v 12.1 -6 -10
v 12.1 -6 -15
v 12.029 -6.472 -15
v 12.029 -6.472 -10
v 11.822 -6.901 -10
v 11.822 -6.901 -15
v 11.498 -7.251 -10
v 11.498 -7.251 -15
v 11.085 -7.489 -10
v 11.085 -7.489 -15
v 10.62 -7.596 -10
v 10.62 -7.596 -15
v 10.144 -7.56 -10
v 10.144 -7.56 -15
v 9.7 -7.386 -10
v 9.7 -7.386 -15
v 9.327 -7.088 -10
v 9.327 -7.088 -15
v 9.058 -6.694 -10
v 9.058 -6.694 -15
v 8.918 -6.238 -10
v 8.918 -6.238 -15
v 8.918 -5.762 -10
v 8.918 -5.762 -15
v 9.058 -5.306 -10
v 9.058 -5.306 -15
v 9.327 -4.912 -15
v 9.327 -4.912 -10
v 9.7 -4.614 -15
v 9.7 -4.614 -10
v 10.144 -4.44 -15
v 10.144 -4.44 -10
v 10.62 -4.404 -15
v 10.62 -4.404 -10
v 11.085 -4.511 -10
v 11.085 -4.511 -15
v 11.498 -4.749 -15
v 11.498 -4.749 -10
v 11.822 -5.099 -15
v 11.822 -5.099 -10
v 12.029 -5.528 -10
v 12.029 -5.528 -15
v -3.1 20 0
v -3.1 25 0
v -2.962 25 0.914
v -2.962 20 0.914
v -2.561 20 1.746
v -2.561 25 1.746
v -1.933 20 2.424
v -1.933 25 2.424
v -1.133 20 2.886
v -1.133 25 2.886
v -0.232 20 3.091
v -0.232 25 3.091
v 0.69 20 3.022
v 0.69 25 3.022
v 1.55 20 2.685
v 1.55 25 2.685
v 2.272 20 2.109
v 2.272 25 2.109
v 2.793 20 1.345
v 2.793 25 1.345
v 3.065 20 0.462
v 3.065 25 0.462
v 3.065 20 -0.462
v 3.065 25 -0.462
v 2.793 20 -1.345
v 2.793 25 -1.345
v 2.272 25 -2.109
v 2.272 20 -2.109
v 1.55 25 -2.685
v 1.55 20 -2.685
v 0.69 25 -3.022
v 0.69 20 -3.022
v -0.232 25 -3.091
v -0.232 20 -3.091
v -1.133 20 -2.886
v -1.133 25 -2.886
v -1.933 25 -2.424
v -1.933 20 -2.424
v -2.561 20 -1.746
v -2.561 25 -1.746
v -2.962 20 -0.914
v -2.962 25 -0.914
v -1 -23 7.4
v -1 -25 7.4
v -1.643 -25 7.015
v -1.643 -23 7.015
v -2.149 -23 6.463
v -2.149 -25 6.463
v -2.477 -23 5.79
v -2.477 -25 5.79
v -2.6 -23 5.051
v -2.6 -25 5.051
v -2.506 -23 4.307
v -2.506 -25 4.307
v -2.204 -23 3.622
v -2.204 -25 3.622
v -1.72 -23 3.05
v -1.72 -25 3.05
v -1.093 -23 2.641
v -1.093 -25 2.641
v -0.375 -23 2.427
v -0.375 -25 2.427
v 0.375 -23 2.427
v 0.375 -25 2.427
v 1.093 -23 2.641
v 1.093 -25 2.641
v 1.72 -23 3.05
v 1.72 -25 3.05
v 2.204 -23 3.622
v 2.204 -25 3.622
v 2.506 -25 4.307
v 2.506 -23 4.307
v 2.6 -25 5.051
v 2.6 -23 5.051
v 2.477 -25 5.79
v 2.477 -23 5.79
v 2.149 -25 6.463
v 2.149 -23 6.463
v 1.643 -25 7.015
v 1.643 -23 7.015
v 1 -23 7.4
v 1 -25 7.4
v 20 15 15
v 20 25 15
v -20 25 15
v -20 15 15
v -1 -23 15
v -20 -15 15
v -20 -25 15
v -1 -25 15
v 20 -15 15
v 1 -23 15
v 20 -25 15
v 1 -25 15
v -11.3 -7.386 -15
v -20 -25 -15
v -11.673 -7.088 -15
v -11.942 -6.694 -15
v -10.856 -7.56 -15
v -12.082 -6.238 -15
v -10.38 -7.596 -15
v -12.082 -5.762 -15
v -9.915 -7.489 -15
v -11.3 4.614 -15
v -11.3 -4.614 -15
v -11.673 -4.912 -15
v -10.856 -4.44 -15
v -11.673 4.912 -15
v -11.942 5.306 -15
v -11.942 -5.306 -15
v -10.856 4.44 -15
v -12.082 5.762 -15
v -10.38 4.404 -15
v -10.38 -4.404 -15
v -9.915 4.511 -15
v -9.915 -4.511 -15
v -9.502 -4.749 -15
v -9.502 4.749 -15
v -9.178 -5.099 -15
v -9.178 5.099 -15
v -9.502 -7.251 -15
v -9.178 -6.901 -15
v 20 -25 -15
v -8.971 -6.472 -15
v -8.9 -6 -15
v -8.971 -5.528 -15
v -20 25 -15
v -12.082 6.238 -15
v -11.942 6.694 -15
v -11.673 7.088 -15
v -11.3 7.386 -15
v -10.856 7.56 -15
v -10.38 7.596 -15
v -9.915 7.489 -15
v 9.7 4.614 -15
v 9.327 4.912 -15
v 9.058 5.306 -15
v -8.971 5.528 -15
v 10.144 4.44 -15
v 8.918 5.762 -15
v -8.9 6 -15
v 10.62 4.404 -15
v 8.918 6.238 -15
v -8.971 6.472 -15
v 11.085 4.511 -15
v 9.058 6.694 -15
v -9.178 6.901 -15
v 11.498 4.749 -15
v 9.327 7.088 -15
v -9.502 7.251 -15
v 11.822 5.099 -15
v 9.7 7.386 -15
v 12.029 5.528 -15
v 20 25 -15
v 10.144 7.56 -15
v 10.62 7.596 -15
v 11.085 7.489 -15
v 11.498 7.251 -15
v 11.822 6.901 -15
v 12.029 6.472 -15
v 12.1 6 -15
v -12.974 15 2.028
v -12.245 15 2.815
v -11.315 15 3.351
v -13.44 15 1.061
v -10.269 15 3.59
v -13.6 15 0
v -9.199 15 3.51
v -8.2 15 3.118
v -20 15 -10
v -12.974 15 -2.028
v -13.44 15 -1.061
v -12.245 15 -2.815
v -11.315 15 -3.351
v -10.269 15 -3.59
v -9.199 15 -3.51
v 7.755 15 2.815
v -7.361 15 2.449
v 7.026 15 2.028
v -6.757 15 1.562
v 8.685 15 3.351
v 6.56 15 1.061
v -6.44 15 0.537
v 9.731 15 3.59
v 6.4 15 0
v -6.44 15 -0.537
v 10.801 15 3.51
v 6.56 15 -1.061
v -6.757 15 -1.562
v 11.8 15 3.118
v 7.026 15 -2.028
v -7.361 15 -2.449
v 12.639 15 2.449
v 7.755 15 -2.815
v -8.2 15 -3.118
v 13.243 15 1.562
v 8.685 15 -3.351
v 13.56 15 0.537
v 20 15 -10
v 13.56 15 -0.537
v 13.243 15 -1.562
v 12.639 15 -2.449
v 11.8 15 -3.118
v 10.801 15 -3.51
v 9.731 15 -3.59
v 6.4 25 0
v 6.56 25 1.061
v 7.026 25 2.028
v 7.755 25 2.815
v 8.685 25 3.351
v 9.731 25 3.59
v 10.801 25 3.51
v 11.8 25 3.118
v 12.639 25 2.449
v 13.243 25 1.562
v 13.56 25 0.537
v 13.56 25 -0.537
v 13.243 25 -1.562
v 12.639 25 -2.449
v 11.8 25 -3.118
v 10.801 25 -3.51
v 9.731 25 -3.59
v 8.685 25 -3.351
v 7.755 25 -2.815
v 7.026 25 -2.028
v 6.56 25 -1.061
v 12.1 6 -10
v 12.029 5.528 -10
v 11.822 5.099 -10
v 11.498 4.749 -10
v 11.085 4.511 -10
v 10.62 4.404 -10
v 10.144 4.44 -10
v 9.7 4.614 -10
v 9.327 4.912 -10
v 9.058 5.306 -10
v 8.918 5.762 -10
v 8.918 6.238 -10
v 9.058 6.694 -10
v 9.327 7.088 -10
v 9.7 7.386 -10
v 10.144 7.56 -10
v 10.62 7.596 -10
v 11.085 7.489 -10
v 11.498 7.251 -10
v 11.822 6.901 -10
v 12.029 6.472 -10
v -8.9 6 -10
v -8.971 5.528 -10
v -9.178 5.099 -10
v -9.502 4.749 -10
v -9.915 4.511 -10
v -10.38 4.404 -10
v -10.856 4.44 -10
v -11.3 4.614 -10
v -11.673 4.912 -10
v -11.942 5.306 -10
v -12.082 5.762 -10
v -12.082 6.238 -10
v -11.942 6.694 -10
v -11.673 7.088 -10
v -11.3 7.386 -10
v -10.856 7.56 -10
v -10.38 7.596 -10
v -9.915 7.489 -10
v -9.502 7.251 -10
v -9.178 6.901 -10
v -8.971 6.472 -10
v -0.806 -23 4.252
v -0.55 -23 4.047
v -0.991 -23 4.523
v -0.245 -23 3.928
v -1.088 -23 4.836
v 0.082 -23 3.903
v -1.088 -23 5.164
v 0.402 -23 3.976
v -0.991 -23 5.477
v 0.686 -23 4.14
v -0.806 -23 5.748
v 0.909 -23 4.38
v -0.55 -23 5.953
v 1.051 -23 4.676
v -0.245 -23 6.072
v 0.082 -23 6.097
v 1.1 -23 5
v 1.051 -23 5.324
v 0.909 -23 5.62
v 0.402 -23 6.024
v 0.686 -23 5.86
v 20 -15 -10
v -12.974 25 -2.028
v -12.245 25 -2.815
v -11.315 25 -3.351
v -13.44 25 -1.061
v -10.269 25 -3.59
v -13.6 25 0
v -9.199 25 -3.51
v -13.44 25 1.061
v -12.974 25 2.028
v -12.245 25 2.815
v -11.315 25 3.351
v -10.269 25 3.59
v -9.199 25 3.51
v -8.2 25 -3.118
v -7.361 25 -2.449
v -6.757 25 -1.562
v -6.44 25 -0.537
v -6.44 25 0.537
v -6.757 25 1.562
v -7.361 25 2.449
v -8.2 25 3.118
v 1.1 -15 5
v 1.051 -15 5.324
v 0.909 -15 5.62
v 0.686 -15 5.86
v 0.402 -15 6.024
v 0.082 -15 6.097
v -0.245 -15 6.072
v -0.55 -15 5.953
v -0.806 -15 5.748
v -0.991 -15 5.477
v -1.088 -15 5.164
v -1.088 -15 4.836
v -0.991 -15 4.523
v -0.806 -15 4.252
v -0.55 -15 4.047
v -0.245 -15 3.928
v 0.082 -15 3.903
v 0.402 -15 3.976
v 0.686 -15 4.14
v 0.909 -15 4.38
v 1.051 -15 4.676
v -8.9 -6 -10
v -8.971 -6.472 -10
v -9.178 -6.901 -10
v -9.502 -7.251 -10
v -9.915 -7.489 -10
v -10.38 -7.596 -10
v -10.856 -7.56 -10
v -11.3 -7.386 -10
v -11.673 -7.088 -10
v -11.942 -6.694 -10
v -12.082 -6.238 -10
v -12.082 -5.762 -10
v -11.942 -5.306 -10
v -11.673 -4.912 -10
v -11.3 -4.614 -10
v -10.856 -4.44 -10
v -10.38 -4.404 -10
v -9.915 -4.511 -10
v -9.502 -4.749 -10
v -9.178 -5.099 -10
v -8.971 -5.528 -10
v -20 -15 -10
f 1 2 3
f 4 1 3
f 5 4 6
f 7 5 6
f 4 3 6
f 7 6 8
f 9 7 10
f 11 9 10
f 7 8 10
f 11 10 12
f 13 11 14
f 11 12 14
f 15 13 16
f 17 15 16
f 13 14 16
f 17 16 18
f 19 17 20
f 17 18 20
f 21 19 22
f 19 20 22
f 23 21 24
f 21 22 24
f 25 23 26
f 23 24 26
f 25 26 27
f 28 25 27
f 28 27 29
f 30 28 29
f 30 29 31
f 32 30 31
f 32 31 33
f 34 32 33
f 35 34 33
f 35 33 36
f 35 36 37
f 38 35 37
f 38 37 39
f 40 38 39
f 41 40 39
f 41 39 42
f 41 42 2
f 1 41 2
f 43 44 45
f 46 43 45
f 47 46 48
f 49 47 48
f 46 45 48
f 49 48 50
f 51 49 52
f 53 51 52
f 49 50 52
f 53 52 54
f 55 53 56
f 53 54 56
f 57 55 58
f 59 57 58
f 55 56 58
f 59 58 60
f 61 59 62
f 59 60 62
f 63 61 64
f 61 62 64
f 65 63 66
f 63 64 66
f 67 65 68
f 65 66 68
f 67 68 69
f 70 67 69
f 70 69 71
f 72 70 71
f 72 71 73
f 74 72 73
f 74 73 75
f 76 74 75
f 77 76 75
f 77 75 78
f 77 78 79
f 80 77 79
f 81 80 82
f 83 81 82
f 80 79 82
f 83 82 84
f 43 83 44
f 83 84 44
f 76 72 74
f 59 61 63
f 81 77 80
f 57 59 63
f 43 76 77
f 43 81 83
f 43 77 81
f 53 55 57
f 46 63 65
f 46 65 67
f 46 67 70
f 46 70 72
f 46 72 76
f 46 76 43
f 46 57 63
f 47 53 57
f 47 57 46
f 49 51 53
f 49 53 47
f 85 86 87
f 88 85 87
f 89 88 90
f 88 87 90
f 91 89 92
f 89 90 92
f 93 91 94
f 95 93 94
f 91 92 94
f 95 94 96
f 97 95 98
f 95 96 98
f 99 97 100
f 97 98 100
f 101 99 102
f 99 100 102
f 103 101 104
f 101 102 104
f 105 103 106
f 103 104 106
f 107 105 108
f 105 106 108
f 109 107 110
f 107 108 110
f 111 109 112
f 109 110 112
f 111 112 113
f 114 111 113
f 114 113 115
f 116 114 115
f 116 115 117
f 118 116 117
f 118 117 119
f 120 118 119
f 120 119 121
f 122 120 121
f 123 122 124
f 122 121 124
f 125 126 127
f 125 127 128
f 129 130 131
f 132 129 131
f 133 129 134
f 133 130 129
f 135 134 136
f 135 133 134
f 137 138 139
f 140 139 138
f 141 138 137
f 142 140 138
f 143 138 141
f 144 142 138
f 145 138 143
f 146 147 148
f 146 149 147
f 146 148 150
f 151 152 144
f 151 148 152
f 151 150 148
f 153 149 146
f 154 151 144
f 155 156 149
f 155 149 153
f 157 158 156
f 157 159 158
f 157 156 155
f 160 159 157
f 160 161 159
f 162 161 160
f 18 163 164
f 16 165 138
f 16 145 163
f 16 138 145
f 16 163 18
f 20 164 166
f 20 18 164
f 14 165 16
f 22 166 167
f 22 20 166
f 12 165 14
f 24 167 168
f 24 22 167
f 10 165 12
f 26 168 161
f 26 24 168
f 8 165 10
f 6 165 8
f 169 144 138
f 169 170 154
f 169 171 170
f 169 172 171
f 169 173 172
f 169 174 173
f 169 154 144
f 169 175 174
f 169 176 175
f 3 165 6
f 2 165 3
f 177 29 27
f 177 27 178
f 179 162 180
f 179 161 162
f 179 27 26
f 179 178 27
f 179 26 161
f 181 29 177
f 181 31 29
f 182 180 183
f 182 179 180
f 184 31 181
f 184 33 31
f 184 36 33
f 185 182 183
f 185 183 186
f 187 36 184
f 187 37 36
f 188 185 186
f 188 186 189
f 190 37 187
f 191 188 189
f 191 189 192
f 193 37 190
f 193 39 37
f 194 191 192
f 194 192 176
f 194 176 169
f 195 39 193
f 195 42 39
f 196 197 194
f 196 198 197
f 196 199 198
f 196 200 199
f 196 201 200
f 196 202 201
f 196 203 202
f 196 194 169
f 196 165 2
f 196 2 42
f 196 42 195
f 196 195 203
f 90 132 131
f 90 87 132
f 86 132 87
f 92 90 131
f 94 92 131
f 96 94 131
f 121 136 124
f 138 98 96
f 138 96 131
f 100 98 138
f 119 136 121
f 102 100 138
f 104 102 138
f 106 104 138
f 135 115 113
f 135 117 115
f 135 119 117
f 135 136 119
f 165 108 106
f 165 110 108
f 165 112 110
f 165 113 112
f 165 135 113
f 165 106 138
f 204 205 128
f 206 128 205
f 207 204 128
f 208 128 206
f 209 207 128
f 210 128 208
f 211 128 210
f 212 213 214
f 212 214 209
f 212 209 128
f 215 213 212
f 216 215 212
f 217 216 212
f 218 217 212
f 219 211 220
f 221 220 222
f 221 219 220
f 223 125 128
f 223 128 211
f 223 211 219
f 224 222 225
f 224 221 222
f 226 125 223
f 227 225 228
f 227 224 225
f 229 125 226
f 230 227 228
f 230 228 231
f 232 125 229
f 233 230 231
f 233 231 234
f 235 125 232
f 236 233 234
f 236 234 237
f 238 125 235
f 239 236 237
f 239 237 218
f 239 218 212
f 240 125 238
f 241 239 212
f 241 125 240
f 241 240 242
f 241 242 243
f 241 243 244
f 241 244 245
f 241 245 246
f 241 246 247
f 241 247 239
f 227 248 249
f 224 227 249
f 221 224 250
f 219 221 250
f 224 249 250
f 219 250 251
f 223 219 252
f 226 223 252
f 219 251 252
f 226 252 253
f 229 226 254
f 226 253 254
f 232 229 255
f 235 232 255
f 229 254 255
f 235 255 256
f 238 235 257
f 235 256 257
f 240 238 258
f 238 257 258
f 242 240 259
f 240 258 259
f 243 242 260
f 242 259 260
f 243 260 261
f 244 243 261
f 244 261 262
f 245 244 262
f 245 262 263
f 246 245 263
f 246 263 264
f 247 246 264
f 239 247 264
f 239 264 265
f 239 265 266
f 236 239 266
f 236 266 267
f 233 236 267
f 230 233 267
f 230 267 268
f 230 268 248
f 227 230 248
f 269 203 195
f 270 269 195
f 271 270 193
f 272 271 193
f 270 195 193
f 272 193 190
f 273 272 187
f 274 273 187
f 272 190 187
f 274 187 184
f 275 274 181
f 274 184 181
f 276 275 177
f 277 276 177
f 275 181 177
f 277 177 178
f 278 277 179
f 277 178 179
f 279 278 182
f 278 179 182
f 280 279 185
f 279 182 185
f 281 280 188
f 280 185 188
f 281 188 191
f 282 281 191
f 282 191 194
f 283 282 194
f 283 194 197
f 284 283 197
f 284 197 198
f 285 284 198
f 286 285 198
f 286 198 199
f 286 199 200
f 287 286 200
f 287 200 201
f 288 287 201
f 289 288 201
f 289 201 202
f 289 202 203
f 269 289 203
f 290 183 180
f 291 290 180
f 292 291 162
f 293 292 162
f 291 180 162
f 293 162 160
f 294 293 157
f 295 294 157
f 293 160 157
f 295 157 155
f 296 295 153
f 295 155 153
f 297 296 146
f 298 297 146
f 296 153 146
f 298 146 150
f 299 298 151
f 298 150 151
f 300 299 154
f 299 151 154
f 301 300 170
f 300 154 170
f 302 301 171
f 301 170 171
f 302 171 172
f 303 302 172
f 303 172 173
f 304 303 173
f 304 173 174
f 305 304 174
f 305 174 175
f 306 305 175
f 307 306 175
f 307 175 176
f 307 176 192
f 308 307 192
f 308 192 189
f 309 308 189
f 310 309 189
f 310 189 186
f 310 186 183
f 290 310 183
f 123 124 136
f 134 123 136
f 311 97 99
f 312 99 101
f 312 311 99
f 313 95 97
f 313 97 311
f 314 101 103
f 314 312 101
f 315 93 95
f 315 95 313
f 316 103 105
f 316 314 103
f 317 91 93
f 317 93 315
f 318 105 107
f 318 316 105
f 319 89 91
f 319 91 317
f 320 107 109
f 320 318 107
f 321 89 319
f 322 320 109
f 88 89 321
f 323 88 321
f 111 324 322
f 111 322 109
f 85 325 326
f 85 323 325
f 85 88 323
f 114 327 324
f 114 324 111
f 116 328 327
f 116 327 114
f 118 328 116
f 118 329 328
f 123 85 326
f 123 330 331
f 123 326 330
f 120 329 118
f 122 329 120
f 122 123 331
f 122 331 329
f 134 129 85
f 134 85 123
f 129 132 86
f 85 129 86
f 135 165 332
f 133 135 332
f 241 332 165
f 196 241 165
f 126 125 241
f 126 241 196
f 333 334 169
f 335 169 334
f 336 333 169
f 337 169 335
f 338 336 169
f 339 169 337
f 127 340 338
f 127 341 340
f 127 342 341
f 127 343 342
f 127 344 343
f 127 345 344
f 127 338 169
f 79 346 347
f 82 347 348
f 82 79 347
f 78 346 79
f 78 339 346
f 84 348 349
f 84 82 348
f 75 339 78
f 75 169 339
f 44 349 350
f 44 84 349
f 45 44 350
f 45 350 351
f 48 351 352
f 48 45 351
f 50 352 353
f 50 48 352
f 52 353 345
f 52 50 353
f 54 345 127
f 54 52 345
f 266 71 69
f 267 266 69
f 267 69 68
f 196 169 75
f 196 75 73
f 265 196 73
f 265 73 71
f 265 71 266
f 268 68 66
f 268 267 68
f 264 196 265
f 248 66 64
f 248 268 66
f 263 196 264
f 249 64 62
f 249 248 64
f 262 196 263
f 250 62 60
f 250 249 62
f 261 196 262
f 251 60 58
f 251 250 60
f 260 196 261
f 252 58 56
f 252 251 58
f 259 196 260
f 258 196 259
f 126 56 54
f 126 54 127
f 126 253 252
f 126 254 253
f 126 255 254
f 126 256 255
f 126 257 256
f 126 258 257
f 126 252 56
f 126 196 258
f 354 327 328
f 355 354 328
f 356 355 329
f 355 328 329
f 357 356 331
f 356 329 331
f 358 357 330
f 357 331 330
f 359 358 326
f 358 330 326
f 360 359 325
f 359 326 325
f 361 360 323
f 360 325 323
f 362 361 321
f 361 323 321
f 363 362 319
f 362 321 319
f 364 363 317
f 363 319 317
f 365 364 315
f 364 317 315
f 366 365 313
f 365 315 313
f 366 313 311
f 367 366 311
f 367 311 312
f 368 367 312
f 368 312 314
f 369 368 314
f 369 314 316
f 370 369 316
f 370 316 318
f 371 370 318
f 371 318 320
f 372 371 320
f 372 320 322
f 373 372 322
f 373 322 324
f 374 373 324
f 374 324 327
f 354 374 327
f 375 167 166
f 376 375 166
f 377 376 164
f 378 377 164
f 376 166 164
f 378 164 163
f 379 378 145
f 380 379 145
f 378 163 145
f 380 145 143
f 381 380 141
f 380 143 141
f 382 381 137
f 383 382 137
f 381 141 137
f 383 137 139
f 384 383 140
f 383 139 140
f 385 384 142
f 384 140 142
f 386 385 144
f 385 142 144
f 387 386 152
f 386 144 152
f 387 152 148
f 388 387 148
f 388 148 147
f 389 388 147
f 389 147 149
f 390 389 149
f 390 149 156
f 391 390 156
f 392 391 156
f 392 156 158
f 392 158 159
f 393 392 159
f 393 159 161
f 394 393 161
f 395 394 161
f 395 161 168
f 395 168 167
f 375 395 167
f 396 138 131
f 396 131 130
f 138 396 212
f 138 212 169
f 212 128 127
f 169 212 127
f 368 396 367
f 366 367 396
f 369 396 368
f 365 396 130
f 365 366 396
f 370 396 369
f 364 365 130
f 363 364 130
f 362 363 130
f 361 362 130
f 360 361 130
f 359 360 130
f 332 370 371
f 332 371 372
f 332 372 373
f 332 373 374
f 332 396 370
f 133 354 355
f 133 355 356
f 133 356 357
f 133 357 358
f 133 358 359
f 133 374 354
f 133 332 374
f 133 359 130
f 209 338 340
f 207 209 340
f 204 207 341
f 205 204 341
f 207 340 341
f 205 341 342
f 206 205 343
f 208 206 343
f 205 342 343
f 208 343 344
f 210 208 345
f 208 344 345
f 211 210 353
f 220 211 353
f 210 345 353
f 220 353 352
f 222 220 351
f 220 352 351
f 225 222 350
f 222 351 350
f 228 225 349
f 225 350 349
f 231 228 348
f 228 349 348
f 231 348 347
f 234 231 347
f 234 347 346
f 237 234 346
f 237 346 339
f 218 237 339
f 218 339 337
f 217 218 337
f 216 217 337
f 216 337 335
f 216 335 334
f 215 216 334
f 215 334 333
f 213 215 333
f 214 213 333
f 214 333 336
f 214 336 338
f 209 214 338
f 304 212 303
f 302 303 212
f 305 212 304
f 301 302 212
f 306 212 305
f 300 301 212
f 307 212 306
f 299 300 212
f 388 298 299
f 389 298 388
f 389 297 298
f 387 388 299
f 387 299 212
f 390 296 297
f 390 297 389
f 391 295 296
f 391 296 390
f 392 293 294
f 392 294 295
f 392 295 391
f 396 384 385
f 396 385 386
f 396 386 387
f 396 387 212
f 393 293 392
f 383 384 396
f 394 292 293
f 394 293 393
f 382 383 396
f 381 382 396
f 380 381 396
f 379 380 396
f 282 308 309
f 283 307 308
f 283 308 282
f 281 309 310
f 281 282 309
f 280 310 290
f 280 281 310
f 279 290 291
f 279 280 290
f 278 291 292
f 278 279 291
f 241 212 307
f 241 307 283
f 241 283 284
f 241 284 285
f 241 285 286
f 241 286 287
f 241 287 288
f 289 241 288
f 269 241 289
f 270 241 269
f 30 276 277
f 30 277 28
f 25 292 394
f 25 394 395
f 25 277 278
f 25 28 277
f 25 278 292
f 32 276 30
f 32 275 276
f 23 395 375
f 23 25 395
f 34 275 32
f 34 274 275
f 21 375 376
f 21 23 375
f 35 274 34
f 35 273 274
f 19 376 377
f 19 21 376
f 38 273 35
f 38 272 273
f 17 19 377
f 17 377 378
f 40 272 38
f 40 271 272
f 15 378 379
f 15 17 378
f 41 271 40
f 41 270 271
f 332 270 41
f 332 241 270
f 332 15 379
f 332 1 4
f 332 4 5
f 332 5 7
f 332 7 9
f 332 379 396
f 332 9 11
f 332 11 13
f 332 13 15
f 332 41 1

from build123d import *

# Parameters (mm, degrees)
F1_DEPTH = 20
F2_R     = 1.6
F3_DEPTH = 25
F4_R     = 1.1
F5_DEPTH = 25
F6_DEPTH = 2
F7_R     = 3.6
F8_DEPTH = 25
F7_R_2   = 3.1
F9_DEPTH = 5


with BuildPart() as f1:
    # F0 (on Right) → F1 (new body, symmetric)
    with BuildSketch(Plane.YZ):
        Polygon((-25, -15), (25, -15), (25, 15), (15, 15), (15, -10), (-15, -10), (-15, 15), (-25, 15), align=None)
    extrude(amount=F1_DEPTH, both=True)

    # F2 (on face) → F3 (cut)
    with BuildSketch(Plane(origin=(0, 0, -15), x_dir=(1, 0, 0), z_dir=(0, 0, -1))):
        with Locations((10.5, 6)):
            Circle(F2_R)
        with Locations((10.5, -6)):
            Circle(F2_R)
        with Locations((-10.5, 6)):
            Circle(F2_R)
        with Locations((-10.5, -6)):
            Circle(F2_R)
    extrude(amount=-F3_DEPTH, mode=Mode.SUBTRACT)

    # F4 (on face) → F5 (cut)
    with BuildSketch(Plane.XZ.offset(25)):
        with Locations((0, 5)):
            Circle(F4_R)
    extrude(amount=-F5_DEPTH, mode=Mode.SUBTRACT)

    # F4 (on face) → F6 (cut)
    with BuildSketch(Plane.XZ.offset(25)):
        with BuildLine():
            Line((-1, 15), (-1, 7.4))
            ThreePointArc((-1, 7.4), (0, 2.4), (1, 7.4))
            Line((1, 7.4), (1, 15))
            Line((1, 15), (-1, 15))
        make_face()
        with Locations((0, 5)):
            Circle(F4_R, mode=Mode.SUBTRACT)
    extrude(amount=-F6_DEPTH, mode=Mode.SUBTRACT)

    # F7 (on face) → F8 (cut)
    with BuildSketch(Plane(origin=(0, 25, 0), x_dir=(-1, 0, 0), z_dir=(0, 1, 0))):
        with Locations((-10, 0)):
            Circle(F7_R)
        with Locations((10, 0)):
            Circle(F7_R)
    extrude(amount=-F8_DEPTH, mode=Mode.SUBTRACT)

    # F7 (on face) → F9 (cut)
    with BuildSketch(Plane(origin=(0, 25, 0), x_dir=(-1, 0, 0), z_dir=(0, 1, 0))):
        Circle(F7_R_2)
    extrude(amount=-F9_DEPTH, mode=Mode.SUBTRACT)


solid = f1.part
